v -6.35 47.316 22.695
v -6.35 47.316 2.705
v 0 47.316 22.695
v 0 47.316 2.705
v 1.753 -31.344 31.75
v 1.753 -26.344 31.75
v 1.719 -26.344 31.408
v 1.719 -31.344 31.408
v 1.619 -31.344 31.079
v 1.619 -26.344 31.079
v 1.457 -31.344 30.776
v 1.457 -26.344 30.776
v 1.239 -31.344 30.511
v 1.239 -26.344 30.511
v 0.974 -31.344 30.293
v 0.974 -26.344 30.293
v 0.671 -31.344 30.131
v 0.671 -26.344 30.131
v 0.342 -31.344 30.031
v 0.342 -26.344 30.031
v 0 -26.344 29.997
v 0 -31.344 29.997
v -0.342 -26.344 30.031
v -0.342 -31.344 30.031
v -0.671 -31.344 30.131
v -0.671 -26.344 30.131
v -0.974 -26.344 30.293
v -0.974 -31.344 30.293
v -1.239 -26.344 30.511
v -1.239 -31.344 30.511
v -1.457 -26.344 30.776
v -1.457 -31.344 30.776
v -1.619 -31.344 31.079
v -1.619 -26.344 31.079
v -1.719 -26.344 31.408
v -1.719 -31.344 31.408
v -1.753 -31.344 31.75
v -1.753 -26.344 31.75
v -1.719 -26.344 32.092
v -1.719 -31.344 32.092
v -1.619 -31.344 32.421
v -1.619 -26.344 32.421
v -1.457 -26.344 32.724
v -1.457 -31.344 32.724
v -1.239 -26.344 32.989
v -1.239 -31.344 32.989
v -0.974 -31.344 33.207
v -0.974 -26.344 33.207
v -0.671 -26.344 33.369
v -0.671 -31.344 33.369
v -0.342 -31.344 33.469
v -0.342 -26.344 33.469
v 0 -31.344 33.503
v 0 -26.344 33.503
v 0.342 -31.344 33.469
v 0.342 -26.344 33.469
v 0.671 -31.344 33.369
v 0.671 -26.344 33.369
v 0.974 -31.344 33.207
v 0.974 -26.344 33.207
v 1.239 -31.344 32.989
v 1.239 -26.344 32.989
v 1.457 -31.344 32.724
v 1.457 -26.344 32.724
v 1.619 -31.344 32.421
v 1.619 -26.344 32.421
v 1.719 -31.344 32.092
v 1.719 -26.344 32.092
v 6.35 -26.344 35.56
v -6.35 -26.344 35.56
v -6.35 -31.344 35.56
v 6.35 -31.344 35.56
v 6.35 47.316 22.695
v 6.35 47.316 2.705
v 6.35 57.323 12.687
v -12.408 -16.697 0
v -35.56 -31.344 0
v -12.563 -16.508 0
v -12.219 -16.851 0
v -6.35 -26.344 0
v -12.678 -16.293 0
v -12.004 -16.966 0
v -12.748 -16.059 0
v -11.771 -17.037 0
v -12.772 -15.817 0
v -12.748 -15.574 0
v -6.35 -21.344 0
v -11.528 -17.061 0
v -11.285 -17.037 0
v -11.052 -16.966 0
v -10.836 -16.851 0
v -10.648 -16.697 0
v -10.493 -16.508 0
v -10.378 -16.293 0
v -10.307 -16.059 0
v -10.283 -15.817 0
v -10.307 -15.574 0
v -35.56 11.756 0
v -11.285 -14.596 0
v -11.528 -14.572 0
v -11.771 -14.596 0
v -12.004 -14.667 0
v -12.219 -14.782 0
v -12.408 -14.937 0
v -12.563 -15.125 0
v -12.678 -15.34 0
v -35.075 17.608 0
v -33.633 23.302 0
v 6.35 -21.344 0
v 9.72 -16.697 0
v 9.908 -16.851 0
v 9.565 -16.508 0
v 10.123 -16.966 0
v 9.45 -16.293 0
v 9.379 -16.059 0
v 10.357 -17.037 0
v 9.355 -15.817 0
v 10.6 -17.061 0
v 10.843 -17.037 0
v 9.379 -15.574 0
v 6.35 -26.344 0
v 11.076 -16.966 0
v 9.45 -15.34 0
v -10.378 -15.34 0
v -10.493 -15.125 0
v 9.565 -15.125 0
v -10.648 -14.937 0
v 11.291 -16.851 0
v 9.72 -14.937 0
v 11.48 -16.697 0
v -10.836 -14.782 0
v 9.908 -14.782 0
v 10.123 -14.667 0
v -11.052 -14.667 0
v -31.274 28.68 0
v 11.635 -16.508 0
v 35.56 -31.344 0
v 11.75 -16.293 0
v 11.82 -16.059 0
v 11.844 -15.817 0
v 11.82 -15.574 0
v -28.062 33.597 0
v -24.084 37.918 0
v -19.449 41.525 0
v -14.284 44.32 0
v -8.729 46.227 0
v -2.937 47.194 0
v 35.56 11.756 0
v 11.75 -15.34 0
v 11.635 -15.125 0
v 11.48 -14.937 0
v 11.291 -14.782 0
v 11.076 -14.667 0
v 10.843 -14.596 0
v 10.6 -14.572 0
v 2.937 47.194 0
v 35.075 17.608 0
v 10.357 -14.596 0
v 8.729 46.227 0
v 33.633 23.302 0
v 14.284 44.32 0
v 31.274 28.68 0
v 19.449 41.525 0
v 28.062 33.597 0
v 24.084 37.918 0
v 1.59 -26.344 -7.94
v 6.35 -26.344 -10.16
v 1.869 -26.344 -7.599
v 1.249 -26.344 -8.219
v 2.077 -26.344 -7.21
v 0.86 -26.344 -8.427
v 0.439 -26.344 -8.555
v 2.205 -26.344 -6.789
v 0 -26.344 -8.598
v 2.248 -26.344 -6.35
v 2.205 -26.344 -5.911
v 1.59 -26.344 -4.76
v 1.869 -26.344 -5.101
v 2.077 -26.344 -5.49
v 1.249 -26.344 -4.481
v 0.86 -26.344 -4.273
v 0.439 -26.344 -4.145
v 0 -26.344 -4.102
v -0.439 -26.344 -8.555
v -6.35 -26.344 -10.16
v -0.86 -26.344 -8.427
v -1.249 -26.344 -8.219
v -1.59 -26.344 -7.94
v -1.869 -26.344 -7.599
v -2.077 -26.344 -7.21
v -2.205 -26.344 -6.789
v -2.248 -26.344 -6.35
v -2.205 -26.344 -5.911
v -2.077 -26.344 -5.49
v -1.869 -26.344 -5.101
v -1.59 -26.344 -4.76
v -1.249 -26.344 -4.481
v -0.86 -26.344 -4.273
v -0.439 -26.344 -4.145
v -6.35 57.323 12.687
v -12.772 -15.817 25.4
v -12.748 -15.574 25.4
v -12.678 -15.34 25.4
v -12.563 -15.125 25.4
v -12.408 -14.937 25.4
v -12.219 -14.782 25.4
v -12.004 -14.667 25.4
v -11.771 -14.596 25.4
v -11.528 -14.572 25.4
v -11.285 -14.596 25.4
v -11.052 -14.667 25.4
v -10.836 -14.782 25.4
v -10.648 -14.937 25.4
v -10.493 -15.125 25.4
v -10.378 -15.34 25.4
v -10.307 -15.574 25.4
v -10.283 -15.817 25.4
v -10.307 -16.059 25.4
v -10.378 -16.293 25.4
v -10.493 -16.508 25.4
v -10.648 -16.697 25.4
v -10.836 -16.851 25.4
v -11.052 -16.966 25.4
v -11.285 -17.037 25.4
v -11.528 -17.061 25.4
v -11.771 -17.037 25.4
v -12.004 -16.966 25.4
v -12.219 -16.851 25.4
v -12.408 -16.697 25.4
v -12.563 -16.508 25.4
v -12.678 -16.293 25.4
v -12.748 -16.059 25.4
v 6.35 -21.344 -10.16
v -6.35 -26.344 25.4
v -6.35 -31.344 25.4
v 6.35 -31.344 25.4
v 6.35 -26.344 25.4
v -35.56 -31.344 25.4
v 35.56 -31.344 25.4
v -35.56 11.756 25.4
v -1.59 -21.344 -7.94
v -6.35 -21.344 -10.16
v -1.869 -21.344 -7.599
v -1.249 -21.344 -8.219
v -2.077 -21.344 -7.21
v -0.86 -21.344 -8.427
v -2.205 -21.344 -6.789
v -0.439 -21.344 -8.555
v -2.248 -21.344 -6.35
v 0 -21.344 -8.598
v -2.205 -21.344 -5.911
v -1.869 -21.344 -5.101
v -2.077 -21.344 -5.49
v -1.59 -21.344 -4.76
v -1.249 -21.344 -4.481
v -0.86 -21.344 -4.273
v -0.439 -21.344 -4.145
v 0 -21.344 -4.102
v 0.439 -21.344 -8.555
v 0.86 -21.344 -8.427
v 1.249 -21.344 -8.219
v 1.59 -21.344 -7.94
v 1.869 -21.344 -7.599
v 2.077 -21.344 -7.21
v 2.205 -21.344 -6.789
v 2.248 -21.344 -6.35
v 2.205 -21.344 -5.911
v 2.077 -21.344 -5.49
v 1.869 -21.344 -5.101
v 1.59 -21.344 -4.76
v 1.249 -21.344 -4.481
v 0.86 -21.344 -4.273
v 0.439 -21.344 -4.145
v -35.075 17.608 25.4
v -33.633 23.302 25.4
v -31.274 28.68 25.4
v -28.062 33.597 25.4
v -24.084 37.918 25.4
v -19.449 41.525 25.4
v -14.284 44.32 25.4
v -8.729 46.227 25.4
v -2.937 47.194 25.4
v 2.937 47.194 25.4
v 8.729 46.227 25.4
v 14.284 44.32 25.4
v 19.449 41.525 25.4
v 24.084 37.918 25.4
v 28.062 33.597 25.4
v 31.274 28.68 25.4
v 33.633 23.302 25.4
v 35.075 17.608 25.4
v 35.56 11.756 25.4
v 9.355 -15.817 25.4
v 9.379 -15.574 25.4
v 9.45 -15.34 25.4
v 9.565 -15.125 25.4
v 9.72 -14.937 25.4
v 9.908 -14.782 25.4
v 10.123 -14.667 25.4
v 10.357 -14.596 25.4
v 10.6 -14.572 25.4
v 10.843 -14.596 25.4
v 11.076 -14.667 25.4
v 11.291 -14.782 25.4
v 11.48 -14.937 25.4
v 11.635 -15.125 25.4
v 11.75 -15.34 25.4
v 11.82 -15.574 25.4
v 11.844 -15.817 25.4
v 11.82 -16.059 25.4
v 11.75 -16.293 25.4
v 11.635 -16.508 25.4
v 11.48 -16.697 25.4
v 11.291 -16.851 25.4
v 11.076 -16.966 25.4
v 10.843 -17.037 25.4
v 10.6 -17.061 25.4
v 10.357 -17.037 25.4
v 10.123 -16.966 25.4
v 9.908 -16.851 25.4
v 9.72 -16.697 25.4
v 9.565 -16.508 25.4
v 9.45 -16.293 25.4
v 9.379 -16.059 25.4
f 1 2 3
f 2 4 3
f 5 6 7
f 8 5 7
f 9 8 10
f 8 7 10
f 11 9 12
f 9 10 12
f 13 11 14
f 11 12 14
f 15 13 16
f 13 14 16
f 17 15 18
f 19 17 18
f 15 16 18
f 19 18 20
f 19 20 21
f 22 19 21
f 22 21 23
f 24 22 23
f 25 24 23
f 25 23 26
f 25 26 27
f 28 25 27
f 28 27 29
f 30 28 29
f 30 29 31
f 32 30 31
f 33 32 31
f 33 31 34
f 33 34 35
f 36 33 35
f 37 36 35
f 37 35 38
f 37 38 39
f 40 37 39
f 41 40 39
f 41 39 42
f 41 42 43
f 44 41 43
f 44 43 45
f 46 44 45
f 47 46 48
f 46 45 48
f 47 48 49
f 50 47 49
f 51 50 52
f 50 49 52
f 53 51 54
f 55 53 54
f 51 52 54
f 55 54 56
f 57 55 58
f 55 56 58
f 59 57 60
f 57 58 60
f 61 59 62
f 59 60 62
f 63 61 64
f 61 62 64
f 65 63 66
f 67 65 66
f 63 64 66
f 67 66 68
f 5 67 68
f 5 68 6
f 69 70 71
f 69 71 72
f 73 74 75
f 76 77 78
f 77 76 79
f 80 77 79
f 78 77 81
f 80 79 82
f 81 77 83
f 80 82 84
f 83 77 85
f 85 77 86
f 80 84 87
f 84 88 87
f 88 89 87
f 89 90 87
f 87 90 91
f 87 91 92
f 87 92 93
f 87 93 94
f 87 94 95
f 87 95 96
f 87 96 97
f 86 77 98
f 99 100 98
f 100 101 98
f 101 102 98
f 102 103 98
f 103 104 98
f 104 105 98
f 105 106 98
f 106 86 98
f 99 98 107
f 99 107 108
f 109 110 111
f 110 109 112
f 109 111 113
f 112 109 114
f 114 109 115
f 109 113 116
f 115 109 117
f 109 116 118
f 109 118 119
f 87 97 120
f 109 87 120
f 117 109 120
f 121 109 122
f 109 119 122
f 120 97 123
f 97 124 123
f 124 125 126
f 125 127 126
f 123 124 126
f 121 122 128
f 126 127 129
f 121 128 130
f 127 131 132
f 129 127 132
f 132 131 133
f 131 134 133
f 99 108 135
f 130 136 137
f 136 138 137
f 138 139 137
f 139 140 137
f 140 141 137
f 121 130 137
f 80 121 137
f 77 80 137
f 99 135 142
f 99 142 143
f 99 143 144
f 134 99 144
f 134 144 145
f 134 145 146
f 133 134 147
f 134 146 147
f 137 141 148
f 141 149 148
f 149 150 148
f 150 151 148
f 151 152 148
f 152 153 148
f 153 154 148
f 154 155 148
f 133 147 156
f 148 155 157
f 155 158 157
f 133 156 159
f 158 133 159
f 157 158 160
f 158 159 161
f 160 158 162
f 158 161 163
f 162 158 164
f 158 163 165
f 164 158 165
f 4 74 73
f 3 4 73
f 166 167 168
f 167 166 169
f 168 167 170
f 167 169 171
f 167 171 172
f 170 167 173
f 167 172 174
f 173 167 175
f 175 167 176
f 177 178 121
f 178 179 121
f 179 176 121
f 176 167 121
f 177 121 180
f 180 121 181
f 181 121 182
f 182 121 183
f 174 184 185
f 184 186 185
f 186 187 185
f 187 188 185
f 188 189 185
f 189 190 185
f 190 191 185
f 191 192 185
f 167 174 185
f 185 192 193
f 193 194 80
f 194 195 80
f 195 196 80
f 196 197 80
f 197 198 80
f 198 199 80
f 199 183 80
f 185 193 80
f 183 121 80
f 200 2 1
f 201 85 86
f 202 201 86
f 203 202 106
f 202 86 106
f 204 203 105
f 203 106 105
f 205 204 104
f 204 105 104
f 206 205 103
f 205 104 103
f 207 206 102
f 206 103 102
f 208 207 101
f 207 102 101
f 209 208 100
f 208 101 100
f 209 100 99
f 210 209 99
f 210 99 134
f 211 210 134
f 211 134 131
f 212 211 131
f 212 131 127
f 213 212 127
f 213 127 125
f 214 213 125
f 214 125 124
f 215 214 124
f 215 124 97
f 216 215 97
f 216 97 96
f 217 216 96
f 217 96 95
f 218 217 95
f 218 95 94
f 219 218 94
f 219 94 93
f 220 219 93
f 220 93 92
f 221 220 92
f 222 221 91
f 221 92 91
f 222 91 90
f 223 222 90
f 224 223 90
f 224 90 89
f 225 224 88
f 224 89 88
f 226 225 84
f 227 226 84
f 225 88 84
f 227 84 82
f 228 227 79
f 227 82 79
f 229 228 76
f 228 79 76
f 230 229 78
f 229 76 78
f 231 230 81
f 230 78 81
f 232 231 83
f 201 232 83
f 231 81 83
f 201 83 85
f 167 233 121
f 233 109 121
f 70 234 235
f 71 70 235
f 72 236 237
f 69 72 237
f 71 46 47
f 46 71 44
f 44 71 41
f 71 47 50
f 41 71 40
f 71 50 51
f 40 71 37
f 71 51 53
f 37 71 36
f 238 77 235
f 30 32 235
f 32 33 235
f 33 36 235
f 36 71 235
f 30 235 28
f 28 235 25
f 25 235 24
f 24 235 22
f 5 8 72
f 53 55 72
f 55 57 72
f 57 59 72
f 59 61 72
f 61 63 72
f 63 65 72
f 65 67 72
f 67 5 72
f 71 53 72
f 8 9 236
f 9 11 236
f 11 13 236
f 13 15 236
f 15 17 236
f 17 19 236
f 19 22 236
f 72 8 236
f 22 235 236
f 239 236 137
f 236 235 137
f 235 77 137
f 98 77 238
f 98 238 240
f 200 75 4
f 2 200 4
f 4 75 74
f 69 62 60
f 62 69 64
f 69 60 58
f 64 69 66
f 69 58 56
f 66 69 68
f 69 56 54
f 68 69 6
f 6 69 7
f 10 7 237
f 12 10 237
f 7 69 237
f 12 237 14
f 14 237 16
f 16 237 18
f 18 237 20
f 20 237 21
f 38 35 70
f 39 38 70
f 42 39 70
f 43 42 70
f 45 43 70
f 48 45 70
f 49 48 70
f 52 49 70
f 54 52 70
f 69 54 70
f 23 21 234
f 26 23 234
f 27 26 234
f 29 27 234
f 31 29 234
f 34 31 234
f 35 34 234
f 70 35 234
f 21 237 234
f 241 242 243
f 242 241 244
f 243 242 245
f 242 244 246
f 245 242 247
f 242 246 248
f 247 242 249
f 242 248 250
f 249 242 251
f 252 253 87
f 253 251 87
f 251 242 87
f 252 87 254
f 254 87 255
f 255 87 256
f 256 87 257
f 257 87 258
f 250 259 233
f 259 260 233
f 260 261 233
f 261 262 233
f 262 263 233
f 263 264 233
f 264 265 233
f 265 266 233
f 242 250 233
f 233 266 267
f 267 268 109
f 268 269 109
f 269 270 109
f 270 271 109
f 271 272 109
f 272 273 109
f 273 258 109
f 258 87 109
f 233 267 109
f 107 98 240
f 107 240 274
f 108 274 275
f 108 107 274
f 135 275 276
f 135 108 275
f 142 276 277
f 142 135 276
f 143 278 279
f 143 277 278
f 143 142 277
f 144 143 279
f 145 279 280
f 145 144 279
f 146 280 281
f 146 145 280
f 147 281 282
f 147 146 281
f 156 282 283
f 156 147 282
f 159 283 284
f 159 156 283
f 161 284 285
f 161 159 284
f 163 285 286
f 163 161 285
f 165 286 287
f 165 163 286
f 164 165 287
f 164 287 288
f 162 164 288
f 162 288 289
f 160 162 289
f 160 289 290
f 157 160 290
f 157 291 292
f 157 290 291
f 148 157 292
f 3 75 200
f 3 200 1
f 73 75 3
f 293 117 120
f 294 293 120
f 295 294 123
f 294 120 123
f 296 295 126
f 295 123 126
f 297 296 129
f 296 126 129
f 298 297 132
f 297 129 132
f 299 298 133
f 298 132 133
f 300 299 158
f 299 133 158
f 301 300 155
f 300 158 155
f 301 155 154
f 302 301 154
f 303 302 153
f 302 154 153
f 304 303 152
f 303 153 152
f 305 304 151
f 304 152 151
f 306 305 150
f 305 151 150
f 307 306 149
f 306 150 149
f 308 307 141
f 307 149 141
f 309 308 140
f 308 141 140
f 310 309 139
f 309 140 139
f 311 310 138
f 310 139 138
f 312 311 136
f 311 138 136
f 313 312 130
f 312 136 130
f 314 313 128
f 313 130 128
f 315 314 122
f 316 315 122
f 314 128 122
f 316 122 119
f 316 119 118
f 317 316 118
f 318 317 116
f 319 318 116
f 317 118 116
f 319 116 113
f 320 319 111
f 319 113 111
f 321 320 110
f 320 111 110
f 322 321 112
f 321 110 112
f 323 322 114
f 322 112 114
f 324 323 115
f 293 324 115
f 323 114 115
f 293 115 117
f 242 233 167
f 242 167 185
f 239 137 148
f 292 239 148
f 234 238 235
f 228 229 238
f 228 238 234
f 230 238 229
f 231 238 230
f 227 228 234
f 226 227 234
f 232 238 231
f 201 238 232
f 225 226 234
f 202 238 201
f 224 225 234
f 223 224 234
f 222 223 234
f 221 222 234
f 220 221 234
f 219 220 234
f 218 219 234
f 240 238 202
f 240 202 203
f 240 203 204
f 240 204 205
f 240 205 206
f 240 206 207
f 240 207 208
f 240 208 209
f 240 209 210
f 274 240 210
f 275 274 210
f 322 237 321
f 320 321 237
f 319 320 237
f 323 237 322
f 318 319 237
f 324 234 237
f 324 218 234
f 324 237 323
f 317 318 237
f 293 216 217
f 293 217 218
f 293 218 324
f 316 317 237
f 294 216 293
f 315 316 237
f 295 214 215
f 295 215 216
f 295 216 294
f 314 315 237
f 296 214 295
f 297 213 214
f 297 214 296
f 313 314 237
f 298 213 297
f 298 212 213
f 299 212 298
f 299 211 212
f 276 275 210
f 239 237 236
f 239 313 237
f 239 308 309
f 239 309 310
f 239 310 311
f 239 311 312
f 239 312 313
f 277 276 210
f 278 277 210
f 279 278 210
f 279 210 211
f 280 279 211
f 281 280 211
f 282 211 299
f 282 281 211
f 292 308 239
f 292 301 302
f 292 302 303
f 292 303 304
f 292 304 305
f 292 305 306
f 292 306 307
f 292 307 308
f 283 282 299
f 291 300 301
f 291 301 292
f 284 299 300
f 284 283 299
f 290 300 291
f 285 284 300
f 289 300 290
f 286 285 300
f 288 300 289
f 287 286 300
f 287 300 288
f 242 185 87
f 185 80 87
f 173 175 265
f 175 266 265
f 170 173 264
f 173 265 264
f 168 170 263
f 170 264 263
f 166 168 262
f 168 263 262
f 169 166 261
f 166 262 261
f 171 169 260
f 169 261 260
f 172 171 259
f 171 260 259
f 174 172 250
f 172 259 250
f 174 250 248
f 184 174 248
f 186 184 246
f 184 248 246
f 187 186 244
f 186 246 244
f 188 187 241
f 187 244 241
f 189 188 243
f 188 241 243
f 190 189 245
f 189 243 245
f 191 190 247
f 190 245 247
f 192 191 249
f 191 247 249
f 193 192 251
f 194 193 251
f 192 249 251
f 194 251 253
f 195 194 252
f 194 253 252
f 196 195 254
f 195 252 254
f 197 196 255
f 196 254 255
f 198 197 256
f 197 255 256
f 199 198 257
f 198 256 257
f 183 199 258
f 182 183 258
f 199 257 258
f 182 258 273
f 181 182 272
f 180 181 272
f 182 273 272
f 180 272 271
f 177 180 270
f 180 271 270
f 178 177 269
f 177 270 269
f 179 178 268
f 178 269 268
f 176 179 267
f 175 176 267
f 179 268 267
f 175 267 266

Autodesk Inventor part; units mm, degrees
ref_plane "YZ Plane" through (0, 0, 0) normal (1, 0, 0) x (0, 1, 0)
ref_plane "XZ Plane" through (0, 0, 0) normal (0, 1, 0) x (-1, 0, 0)
sketch "Sketch1" plane through (0, 0, 0) normal (0, 0, 1) x (1, 0, 0)
  line L0 (6.35, -26.3445) -> (6.35, -31.3445) projected
  line L1 (6.35, -31.3445) -> (38.1, -31.3445) projected
  line L2 (38.1, -31.3445) -> (38.1, 11.7555) projected
  arc A0 (38.1, 11.7555) -> (-38.1, 11.7555) centre (0, 11.7555) ccw projected
  line L3 (-38.1, 11.7555) -> (-38.1, -31.3445) projected
  line L4 (-38.1, -31.3445) -> (-6.35, -31.3445) projected
  line L5 (-6.35, -31.3445) -> (-6.35, -26.3445) projected
  line L6 (-6.35, -26.3445) -> (6.35, -26.3445) projected
  circle A1 centre (0, 11.7555) radius 35.56
  line L7 (-35.56, 11.7555) -> (33.02, 11.7555)
  line L8 (33.02, -31.3445) -> (-35.56, -31.3445)
  line L9 (-35.56, -31.3445) -> (-35.56, 11.7555)
  line L10 (35.56, 11.7555) -> (-35.56, 11.7555)
  line L11 (-35.56, 11.7555) -> (-35.56, -31.3445)
  line L12 (-35.56, -31.3445) -> (35.56, -31.3445)
  line L13 (35.56, -31.3445) -> (35.56, 11.7555)
  point P0 (0, 0)
  dimension "d0" = 71.12
extrude "Extrusion1" add sketch "Sketch1" along normal blind 25.4 contours L6 L5 L4 L9 A1 L13 L1 L0 | L0 L8 L5 L6 | L10 L7 A1 | A1 L7 L10
sketch "Sketch2" plane through (0, 0, 0) normal (0, 0, -1) x (-1, 0, 0)
  line L0 (6.3749, -31.3445) -> (-6.9601, -31.3445) projected
  line L1 (-6.9601, -31.3445) -> (-6.9601, -26.3445) projected
  line L2 (-6.9601, -26.3445) -> (6.3749, -26.3445) projected
  line L3 (6.3749, -26.3445) -> (6.3749, -31.3445) projected
  line L4 (35.56, -31.3445) -> (-35.56, -31.3445) projected
  line L5 (0, -26.3445) -> (6.35, -26.3445)
  line L6 (6.35, -26.3445) -> (-6.35, -26.3445)
  line L7 (-6.35, -26.3445) -> (6.35, -26.3445)
  line L8 (6.35, -26.3445) -> (6.35, -21.3445)
  line L9 (6.35, -21.3445) -> (-6.35, -21.3445)
  line L10 (-6.35, -21.3445) -> (-6.35, -26.3445)
  line L11 (-6.35, -26.3445) -> (-6.35, -21.3445)
  point P0 (0, 0)
  dimension "d45" = 6.35
  dimension "d46" = 12.7
  dimension "d51" = 12.7
extrude "Extrusion2" add sketch "Sketch2" along normal blind 10.16 contours L2 L10 L9 L8
sketch "Sketch4" plane through (0, 0, 25.4) normal (0, 0, 1) x (1, 0, 0)
  line L0 (-35.56, -31.3445) -> (35.56, -31.3445) projected
  line L1 (-35.56, -31.3445) -> (35.56, -31.3445)
  line L2 (0, -31.3445) -> (6.35, -31.3445)
  line L3 (6.35, -31.3445) -> (-6.35, -31.3445)
  line L4 (6.9601, -26.3445) -> (-6.35, -26.3445) projected
  line L5 (-6.35, -31.3445) -> (6.35, -31.3445)
  line L6 (6.35, -31.3445) -> (6.35, -26.3445)
  line L7 (6.35, -26.3445) -> (-6.35, -26.3445)
  line L8 (-6.35, -26.3445) -> (-6.35, -31.3445)
  point P0 (0, 0)
  dimension "d39" = 6.35
  dimension "d40" = 12.7
  dimension "d52" = 12.7
extrude "Extrusion4" add sketch "Sketch4" along normal blind 10.16
ref_plane "Work Plane1" through (0, -31.3445, 0) normal (-1, 0, 0) x (0, 0, 1)
sketch "Sketch7" plane through (0, -31.3445, 0) normal (-1, 0, 0) x (0, 0, 1)
  line L0 (0, 78.66) -> (0, 43.1) projected
  line L1 (0, 78.66) -> (2.7051, 78.66)
  line L2 (0, 78.66) -> (25.4, 78.66) projected
  line L3 (2.7051, 78.66) -> (22.6949, 78.66)
  line L4 (22.6949, 78.66) -> (12.6873, 78.66)
  line L5 (12.6873, 78.66) -> (12.6873, 88.6676)
  line L6 (12.6873, 88.6676) -> (22.6949, 78.66)
  line L7 (12.6873, 88.6676) -> (2.7051, 78.66)
  point P0 (0, 31.3445)
  dimension "d27" = 2.7051
  dimension "d28" = 19.9898
  dimension "d29" = 10.0076
  dimension "d30" = 10.0076
extrude "Extrusion7" add sketch "Sketch7" along normal mid plane 12.7
sketch "Sketch9" plane through (-6.35, -26.3445, 25.4) normal (0, 1, 0) x (1, 0, 0)
  line L0 (12.7, -10.16) -> (0, -10.16) projected
  line L1 (6.35, -10.16) -> (6.35, -6.35)
  circle A0 centre (6.35, -6.35) radius 1.7526
  point P0 (6.35, 25.4)
  dimension "d41" = 3.81
  dimension "d42" = 3.5052
extrude "Extrusion9" cut sketch "Sketch9" against normal blind 25.4
sketch "Sketch10" plane through (-6.35, -21.3445, 0) normal (0, 1, 0) x (1, 0, 0)
  line L0 (12.7, 10.16) -> (0, 10.16) projected
  line L1 (6.35, 10.16) -> (6.35, 6.35)
  circle A0 centre (6.35, 6.35) radius 2.2479
  point P0 (6.35, 0)
  dimension "d47" = 3.81
  dimension "d48" = 4.4958
extrude "Extrusion10" cut sketch "Sketch10" against normal blind 25.4
sketch "Sketch11" plane through (0, 0, 0) normal (0, 0, -1) x (-1, 0, 0)
  ellipse E0 centre (-11.5997, -15.8166) end of major axis (-11.5997, -14.5666) minor radius 1.2499 projected
  ellipse E1 centre (12.5278, -15.8166) end of major axis (12.5278, -14.5666) minor radius 1.2499 projected
  line L0 (-11.5997, -15.8166) -> (-10.5997, -15.8166)
  circle A0 centre (-10.5997, -15.8166) radius 1.2446
  line L1 (12.5278, -15.8166) -> (11.5278, -15.8166)
  circle A1 centre (11.5278, -15.8166) radius 1.2446
  point P0 (0, 0)
  dimension "d53" = 1
  dimension "d54" = 2.4892
  dimension "d55" = 1
  dimension "d56" = 2.4892
extrude "Extrusion11" cut sketch "Sketch11" against normal blind 25.4 contours A0 E0 | E0 A0 | A1 E1 | E1 A1 picked at (-11.3426, -15.9919) picked at (-9.6993, -15.9182) picked at (12.2707, -15.6413) picked at (10.6274, -15.715)
properties part number "Tail2"
